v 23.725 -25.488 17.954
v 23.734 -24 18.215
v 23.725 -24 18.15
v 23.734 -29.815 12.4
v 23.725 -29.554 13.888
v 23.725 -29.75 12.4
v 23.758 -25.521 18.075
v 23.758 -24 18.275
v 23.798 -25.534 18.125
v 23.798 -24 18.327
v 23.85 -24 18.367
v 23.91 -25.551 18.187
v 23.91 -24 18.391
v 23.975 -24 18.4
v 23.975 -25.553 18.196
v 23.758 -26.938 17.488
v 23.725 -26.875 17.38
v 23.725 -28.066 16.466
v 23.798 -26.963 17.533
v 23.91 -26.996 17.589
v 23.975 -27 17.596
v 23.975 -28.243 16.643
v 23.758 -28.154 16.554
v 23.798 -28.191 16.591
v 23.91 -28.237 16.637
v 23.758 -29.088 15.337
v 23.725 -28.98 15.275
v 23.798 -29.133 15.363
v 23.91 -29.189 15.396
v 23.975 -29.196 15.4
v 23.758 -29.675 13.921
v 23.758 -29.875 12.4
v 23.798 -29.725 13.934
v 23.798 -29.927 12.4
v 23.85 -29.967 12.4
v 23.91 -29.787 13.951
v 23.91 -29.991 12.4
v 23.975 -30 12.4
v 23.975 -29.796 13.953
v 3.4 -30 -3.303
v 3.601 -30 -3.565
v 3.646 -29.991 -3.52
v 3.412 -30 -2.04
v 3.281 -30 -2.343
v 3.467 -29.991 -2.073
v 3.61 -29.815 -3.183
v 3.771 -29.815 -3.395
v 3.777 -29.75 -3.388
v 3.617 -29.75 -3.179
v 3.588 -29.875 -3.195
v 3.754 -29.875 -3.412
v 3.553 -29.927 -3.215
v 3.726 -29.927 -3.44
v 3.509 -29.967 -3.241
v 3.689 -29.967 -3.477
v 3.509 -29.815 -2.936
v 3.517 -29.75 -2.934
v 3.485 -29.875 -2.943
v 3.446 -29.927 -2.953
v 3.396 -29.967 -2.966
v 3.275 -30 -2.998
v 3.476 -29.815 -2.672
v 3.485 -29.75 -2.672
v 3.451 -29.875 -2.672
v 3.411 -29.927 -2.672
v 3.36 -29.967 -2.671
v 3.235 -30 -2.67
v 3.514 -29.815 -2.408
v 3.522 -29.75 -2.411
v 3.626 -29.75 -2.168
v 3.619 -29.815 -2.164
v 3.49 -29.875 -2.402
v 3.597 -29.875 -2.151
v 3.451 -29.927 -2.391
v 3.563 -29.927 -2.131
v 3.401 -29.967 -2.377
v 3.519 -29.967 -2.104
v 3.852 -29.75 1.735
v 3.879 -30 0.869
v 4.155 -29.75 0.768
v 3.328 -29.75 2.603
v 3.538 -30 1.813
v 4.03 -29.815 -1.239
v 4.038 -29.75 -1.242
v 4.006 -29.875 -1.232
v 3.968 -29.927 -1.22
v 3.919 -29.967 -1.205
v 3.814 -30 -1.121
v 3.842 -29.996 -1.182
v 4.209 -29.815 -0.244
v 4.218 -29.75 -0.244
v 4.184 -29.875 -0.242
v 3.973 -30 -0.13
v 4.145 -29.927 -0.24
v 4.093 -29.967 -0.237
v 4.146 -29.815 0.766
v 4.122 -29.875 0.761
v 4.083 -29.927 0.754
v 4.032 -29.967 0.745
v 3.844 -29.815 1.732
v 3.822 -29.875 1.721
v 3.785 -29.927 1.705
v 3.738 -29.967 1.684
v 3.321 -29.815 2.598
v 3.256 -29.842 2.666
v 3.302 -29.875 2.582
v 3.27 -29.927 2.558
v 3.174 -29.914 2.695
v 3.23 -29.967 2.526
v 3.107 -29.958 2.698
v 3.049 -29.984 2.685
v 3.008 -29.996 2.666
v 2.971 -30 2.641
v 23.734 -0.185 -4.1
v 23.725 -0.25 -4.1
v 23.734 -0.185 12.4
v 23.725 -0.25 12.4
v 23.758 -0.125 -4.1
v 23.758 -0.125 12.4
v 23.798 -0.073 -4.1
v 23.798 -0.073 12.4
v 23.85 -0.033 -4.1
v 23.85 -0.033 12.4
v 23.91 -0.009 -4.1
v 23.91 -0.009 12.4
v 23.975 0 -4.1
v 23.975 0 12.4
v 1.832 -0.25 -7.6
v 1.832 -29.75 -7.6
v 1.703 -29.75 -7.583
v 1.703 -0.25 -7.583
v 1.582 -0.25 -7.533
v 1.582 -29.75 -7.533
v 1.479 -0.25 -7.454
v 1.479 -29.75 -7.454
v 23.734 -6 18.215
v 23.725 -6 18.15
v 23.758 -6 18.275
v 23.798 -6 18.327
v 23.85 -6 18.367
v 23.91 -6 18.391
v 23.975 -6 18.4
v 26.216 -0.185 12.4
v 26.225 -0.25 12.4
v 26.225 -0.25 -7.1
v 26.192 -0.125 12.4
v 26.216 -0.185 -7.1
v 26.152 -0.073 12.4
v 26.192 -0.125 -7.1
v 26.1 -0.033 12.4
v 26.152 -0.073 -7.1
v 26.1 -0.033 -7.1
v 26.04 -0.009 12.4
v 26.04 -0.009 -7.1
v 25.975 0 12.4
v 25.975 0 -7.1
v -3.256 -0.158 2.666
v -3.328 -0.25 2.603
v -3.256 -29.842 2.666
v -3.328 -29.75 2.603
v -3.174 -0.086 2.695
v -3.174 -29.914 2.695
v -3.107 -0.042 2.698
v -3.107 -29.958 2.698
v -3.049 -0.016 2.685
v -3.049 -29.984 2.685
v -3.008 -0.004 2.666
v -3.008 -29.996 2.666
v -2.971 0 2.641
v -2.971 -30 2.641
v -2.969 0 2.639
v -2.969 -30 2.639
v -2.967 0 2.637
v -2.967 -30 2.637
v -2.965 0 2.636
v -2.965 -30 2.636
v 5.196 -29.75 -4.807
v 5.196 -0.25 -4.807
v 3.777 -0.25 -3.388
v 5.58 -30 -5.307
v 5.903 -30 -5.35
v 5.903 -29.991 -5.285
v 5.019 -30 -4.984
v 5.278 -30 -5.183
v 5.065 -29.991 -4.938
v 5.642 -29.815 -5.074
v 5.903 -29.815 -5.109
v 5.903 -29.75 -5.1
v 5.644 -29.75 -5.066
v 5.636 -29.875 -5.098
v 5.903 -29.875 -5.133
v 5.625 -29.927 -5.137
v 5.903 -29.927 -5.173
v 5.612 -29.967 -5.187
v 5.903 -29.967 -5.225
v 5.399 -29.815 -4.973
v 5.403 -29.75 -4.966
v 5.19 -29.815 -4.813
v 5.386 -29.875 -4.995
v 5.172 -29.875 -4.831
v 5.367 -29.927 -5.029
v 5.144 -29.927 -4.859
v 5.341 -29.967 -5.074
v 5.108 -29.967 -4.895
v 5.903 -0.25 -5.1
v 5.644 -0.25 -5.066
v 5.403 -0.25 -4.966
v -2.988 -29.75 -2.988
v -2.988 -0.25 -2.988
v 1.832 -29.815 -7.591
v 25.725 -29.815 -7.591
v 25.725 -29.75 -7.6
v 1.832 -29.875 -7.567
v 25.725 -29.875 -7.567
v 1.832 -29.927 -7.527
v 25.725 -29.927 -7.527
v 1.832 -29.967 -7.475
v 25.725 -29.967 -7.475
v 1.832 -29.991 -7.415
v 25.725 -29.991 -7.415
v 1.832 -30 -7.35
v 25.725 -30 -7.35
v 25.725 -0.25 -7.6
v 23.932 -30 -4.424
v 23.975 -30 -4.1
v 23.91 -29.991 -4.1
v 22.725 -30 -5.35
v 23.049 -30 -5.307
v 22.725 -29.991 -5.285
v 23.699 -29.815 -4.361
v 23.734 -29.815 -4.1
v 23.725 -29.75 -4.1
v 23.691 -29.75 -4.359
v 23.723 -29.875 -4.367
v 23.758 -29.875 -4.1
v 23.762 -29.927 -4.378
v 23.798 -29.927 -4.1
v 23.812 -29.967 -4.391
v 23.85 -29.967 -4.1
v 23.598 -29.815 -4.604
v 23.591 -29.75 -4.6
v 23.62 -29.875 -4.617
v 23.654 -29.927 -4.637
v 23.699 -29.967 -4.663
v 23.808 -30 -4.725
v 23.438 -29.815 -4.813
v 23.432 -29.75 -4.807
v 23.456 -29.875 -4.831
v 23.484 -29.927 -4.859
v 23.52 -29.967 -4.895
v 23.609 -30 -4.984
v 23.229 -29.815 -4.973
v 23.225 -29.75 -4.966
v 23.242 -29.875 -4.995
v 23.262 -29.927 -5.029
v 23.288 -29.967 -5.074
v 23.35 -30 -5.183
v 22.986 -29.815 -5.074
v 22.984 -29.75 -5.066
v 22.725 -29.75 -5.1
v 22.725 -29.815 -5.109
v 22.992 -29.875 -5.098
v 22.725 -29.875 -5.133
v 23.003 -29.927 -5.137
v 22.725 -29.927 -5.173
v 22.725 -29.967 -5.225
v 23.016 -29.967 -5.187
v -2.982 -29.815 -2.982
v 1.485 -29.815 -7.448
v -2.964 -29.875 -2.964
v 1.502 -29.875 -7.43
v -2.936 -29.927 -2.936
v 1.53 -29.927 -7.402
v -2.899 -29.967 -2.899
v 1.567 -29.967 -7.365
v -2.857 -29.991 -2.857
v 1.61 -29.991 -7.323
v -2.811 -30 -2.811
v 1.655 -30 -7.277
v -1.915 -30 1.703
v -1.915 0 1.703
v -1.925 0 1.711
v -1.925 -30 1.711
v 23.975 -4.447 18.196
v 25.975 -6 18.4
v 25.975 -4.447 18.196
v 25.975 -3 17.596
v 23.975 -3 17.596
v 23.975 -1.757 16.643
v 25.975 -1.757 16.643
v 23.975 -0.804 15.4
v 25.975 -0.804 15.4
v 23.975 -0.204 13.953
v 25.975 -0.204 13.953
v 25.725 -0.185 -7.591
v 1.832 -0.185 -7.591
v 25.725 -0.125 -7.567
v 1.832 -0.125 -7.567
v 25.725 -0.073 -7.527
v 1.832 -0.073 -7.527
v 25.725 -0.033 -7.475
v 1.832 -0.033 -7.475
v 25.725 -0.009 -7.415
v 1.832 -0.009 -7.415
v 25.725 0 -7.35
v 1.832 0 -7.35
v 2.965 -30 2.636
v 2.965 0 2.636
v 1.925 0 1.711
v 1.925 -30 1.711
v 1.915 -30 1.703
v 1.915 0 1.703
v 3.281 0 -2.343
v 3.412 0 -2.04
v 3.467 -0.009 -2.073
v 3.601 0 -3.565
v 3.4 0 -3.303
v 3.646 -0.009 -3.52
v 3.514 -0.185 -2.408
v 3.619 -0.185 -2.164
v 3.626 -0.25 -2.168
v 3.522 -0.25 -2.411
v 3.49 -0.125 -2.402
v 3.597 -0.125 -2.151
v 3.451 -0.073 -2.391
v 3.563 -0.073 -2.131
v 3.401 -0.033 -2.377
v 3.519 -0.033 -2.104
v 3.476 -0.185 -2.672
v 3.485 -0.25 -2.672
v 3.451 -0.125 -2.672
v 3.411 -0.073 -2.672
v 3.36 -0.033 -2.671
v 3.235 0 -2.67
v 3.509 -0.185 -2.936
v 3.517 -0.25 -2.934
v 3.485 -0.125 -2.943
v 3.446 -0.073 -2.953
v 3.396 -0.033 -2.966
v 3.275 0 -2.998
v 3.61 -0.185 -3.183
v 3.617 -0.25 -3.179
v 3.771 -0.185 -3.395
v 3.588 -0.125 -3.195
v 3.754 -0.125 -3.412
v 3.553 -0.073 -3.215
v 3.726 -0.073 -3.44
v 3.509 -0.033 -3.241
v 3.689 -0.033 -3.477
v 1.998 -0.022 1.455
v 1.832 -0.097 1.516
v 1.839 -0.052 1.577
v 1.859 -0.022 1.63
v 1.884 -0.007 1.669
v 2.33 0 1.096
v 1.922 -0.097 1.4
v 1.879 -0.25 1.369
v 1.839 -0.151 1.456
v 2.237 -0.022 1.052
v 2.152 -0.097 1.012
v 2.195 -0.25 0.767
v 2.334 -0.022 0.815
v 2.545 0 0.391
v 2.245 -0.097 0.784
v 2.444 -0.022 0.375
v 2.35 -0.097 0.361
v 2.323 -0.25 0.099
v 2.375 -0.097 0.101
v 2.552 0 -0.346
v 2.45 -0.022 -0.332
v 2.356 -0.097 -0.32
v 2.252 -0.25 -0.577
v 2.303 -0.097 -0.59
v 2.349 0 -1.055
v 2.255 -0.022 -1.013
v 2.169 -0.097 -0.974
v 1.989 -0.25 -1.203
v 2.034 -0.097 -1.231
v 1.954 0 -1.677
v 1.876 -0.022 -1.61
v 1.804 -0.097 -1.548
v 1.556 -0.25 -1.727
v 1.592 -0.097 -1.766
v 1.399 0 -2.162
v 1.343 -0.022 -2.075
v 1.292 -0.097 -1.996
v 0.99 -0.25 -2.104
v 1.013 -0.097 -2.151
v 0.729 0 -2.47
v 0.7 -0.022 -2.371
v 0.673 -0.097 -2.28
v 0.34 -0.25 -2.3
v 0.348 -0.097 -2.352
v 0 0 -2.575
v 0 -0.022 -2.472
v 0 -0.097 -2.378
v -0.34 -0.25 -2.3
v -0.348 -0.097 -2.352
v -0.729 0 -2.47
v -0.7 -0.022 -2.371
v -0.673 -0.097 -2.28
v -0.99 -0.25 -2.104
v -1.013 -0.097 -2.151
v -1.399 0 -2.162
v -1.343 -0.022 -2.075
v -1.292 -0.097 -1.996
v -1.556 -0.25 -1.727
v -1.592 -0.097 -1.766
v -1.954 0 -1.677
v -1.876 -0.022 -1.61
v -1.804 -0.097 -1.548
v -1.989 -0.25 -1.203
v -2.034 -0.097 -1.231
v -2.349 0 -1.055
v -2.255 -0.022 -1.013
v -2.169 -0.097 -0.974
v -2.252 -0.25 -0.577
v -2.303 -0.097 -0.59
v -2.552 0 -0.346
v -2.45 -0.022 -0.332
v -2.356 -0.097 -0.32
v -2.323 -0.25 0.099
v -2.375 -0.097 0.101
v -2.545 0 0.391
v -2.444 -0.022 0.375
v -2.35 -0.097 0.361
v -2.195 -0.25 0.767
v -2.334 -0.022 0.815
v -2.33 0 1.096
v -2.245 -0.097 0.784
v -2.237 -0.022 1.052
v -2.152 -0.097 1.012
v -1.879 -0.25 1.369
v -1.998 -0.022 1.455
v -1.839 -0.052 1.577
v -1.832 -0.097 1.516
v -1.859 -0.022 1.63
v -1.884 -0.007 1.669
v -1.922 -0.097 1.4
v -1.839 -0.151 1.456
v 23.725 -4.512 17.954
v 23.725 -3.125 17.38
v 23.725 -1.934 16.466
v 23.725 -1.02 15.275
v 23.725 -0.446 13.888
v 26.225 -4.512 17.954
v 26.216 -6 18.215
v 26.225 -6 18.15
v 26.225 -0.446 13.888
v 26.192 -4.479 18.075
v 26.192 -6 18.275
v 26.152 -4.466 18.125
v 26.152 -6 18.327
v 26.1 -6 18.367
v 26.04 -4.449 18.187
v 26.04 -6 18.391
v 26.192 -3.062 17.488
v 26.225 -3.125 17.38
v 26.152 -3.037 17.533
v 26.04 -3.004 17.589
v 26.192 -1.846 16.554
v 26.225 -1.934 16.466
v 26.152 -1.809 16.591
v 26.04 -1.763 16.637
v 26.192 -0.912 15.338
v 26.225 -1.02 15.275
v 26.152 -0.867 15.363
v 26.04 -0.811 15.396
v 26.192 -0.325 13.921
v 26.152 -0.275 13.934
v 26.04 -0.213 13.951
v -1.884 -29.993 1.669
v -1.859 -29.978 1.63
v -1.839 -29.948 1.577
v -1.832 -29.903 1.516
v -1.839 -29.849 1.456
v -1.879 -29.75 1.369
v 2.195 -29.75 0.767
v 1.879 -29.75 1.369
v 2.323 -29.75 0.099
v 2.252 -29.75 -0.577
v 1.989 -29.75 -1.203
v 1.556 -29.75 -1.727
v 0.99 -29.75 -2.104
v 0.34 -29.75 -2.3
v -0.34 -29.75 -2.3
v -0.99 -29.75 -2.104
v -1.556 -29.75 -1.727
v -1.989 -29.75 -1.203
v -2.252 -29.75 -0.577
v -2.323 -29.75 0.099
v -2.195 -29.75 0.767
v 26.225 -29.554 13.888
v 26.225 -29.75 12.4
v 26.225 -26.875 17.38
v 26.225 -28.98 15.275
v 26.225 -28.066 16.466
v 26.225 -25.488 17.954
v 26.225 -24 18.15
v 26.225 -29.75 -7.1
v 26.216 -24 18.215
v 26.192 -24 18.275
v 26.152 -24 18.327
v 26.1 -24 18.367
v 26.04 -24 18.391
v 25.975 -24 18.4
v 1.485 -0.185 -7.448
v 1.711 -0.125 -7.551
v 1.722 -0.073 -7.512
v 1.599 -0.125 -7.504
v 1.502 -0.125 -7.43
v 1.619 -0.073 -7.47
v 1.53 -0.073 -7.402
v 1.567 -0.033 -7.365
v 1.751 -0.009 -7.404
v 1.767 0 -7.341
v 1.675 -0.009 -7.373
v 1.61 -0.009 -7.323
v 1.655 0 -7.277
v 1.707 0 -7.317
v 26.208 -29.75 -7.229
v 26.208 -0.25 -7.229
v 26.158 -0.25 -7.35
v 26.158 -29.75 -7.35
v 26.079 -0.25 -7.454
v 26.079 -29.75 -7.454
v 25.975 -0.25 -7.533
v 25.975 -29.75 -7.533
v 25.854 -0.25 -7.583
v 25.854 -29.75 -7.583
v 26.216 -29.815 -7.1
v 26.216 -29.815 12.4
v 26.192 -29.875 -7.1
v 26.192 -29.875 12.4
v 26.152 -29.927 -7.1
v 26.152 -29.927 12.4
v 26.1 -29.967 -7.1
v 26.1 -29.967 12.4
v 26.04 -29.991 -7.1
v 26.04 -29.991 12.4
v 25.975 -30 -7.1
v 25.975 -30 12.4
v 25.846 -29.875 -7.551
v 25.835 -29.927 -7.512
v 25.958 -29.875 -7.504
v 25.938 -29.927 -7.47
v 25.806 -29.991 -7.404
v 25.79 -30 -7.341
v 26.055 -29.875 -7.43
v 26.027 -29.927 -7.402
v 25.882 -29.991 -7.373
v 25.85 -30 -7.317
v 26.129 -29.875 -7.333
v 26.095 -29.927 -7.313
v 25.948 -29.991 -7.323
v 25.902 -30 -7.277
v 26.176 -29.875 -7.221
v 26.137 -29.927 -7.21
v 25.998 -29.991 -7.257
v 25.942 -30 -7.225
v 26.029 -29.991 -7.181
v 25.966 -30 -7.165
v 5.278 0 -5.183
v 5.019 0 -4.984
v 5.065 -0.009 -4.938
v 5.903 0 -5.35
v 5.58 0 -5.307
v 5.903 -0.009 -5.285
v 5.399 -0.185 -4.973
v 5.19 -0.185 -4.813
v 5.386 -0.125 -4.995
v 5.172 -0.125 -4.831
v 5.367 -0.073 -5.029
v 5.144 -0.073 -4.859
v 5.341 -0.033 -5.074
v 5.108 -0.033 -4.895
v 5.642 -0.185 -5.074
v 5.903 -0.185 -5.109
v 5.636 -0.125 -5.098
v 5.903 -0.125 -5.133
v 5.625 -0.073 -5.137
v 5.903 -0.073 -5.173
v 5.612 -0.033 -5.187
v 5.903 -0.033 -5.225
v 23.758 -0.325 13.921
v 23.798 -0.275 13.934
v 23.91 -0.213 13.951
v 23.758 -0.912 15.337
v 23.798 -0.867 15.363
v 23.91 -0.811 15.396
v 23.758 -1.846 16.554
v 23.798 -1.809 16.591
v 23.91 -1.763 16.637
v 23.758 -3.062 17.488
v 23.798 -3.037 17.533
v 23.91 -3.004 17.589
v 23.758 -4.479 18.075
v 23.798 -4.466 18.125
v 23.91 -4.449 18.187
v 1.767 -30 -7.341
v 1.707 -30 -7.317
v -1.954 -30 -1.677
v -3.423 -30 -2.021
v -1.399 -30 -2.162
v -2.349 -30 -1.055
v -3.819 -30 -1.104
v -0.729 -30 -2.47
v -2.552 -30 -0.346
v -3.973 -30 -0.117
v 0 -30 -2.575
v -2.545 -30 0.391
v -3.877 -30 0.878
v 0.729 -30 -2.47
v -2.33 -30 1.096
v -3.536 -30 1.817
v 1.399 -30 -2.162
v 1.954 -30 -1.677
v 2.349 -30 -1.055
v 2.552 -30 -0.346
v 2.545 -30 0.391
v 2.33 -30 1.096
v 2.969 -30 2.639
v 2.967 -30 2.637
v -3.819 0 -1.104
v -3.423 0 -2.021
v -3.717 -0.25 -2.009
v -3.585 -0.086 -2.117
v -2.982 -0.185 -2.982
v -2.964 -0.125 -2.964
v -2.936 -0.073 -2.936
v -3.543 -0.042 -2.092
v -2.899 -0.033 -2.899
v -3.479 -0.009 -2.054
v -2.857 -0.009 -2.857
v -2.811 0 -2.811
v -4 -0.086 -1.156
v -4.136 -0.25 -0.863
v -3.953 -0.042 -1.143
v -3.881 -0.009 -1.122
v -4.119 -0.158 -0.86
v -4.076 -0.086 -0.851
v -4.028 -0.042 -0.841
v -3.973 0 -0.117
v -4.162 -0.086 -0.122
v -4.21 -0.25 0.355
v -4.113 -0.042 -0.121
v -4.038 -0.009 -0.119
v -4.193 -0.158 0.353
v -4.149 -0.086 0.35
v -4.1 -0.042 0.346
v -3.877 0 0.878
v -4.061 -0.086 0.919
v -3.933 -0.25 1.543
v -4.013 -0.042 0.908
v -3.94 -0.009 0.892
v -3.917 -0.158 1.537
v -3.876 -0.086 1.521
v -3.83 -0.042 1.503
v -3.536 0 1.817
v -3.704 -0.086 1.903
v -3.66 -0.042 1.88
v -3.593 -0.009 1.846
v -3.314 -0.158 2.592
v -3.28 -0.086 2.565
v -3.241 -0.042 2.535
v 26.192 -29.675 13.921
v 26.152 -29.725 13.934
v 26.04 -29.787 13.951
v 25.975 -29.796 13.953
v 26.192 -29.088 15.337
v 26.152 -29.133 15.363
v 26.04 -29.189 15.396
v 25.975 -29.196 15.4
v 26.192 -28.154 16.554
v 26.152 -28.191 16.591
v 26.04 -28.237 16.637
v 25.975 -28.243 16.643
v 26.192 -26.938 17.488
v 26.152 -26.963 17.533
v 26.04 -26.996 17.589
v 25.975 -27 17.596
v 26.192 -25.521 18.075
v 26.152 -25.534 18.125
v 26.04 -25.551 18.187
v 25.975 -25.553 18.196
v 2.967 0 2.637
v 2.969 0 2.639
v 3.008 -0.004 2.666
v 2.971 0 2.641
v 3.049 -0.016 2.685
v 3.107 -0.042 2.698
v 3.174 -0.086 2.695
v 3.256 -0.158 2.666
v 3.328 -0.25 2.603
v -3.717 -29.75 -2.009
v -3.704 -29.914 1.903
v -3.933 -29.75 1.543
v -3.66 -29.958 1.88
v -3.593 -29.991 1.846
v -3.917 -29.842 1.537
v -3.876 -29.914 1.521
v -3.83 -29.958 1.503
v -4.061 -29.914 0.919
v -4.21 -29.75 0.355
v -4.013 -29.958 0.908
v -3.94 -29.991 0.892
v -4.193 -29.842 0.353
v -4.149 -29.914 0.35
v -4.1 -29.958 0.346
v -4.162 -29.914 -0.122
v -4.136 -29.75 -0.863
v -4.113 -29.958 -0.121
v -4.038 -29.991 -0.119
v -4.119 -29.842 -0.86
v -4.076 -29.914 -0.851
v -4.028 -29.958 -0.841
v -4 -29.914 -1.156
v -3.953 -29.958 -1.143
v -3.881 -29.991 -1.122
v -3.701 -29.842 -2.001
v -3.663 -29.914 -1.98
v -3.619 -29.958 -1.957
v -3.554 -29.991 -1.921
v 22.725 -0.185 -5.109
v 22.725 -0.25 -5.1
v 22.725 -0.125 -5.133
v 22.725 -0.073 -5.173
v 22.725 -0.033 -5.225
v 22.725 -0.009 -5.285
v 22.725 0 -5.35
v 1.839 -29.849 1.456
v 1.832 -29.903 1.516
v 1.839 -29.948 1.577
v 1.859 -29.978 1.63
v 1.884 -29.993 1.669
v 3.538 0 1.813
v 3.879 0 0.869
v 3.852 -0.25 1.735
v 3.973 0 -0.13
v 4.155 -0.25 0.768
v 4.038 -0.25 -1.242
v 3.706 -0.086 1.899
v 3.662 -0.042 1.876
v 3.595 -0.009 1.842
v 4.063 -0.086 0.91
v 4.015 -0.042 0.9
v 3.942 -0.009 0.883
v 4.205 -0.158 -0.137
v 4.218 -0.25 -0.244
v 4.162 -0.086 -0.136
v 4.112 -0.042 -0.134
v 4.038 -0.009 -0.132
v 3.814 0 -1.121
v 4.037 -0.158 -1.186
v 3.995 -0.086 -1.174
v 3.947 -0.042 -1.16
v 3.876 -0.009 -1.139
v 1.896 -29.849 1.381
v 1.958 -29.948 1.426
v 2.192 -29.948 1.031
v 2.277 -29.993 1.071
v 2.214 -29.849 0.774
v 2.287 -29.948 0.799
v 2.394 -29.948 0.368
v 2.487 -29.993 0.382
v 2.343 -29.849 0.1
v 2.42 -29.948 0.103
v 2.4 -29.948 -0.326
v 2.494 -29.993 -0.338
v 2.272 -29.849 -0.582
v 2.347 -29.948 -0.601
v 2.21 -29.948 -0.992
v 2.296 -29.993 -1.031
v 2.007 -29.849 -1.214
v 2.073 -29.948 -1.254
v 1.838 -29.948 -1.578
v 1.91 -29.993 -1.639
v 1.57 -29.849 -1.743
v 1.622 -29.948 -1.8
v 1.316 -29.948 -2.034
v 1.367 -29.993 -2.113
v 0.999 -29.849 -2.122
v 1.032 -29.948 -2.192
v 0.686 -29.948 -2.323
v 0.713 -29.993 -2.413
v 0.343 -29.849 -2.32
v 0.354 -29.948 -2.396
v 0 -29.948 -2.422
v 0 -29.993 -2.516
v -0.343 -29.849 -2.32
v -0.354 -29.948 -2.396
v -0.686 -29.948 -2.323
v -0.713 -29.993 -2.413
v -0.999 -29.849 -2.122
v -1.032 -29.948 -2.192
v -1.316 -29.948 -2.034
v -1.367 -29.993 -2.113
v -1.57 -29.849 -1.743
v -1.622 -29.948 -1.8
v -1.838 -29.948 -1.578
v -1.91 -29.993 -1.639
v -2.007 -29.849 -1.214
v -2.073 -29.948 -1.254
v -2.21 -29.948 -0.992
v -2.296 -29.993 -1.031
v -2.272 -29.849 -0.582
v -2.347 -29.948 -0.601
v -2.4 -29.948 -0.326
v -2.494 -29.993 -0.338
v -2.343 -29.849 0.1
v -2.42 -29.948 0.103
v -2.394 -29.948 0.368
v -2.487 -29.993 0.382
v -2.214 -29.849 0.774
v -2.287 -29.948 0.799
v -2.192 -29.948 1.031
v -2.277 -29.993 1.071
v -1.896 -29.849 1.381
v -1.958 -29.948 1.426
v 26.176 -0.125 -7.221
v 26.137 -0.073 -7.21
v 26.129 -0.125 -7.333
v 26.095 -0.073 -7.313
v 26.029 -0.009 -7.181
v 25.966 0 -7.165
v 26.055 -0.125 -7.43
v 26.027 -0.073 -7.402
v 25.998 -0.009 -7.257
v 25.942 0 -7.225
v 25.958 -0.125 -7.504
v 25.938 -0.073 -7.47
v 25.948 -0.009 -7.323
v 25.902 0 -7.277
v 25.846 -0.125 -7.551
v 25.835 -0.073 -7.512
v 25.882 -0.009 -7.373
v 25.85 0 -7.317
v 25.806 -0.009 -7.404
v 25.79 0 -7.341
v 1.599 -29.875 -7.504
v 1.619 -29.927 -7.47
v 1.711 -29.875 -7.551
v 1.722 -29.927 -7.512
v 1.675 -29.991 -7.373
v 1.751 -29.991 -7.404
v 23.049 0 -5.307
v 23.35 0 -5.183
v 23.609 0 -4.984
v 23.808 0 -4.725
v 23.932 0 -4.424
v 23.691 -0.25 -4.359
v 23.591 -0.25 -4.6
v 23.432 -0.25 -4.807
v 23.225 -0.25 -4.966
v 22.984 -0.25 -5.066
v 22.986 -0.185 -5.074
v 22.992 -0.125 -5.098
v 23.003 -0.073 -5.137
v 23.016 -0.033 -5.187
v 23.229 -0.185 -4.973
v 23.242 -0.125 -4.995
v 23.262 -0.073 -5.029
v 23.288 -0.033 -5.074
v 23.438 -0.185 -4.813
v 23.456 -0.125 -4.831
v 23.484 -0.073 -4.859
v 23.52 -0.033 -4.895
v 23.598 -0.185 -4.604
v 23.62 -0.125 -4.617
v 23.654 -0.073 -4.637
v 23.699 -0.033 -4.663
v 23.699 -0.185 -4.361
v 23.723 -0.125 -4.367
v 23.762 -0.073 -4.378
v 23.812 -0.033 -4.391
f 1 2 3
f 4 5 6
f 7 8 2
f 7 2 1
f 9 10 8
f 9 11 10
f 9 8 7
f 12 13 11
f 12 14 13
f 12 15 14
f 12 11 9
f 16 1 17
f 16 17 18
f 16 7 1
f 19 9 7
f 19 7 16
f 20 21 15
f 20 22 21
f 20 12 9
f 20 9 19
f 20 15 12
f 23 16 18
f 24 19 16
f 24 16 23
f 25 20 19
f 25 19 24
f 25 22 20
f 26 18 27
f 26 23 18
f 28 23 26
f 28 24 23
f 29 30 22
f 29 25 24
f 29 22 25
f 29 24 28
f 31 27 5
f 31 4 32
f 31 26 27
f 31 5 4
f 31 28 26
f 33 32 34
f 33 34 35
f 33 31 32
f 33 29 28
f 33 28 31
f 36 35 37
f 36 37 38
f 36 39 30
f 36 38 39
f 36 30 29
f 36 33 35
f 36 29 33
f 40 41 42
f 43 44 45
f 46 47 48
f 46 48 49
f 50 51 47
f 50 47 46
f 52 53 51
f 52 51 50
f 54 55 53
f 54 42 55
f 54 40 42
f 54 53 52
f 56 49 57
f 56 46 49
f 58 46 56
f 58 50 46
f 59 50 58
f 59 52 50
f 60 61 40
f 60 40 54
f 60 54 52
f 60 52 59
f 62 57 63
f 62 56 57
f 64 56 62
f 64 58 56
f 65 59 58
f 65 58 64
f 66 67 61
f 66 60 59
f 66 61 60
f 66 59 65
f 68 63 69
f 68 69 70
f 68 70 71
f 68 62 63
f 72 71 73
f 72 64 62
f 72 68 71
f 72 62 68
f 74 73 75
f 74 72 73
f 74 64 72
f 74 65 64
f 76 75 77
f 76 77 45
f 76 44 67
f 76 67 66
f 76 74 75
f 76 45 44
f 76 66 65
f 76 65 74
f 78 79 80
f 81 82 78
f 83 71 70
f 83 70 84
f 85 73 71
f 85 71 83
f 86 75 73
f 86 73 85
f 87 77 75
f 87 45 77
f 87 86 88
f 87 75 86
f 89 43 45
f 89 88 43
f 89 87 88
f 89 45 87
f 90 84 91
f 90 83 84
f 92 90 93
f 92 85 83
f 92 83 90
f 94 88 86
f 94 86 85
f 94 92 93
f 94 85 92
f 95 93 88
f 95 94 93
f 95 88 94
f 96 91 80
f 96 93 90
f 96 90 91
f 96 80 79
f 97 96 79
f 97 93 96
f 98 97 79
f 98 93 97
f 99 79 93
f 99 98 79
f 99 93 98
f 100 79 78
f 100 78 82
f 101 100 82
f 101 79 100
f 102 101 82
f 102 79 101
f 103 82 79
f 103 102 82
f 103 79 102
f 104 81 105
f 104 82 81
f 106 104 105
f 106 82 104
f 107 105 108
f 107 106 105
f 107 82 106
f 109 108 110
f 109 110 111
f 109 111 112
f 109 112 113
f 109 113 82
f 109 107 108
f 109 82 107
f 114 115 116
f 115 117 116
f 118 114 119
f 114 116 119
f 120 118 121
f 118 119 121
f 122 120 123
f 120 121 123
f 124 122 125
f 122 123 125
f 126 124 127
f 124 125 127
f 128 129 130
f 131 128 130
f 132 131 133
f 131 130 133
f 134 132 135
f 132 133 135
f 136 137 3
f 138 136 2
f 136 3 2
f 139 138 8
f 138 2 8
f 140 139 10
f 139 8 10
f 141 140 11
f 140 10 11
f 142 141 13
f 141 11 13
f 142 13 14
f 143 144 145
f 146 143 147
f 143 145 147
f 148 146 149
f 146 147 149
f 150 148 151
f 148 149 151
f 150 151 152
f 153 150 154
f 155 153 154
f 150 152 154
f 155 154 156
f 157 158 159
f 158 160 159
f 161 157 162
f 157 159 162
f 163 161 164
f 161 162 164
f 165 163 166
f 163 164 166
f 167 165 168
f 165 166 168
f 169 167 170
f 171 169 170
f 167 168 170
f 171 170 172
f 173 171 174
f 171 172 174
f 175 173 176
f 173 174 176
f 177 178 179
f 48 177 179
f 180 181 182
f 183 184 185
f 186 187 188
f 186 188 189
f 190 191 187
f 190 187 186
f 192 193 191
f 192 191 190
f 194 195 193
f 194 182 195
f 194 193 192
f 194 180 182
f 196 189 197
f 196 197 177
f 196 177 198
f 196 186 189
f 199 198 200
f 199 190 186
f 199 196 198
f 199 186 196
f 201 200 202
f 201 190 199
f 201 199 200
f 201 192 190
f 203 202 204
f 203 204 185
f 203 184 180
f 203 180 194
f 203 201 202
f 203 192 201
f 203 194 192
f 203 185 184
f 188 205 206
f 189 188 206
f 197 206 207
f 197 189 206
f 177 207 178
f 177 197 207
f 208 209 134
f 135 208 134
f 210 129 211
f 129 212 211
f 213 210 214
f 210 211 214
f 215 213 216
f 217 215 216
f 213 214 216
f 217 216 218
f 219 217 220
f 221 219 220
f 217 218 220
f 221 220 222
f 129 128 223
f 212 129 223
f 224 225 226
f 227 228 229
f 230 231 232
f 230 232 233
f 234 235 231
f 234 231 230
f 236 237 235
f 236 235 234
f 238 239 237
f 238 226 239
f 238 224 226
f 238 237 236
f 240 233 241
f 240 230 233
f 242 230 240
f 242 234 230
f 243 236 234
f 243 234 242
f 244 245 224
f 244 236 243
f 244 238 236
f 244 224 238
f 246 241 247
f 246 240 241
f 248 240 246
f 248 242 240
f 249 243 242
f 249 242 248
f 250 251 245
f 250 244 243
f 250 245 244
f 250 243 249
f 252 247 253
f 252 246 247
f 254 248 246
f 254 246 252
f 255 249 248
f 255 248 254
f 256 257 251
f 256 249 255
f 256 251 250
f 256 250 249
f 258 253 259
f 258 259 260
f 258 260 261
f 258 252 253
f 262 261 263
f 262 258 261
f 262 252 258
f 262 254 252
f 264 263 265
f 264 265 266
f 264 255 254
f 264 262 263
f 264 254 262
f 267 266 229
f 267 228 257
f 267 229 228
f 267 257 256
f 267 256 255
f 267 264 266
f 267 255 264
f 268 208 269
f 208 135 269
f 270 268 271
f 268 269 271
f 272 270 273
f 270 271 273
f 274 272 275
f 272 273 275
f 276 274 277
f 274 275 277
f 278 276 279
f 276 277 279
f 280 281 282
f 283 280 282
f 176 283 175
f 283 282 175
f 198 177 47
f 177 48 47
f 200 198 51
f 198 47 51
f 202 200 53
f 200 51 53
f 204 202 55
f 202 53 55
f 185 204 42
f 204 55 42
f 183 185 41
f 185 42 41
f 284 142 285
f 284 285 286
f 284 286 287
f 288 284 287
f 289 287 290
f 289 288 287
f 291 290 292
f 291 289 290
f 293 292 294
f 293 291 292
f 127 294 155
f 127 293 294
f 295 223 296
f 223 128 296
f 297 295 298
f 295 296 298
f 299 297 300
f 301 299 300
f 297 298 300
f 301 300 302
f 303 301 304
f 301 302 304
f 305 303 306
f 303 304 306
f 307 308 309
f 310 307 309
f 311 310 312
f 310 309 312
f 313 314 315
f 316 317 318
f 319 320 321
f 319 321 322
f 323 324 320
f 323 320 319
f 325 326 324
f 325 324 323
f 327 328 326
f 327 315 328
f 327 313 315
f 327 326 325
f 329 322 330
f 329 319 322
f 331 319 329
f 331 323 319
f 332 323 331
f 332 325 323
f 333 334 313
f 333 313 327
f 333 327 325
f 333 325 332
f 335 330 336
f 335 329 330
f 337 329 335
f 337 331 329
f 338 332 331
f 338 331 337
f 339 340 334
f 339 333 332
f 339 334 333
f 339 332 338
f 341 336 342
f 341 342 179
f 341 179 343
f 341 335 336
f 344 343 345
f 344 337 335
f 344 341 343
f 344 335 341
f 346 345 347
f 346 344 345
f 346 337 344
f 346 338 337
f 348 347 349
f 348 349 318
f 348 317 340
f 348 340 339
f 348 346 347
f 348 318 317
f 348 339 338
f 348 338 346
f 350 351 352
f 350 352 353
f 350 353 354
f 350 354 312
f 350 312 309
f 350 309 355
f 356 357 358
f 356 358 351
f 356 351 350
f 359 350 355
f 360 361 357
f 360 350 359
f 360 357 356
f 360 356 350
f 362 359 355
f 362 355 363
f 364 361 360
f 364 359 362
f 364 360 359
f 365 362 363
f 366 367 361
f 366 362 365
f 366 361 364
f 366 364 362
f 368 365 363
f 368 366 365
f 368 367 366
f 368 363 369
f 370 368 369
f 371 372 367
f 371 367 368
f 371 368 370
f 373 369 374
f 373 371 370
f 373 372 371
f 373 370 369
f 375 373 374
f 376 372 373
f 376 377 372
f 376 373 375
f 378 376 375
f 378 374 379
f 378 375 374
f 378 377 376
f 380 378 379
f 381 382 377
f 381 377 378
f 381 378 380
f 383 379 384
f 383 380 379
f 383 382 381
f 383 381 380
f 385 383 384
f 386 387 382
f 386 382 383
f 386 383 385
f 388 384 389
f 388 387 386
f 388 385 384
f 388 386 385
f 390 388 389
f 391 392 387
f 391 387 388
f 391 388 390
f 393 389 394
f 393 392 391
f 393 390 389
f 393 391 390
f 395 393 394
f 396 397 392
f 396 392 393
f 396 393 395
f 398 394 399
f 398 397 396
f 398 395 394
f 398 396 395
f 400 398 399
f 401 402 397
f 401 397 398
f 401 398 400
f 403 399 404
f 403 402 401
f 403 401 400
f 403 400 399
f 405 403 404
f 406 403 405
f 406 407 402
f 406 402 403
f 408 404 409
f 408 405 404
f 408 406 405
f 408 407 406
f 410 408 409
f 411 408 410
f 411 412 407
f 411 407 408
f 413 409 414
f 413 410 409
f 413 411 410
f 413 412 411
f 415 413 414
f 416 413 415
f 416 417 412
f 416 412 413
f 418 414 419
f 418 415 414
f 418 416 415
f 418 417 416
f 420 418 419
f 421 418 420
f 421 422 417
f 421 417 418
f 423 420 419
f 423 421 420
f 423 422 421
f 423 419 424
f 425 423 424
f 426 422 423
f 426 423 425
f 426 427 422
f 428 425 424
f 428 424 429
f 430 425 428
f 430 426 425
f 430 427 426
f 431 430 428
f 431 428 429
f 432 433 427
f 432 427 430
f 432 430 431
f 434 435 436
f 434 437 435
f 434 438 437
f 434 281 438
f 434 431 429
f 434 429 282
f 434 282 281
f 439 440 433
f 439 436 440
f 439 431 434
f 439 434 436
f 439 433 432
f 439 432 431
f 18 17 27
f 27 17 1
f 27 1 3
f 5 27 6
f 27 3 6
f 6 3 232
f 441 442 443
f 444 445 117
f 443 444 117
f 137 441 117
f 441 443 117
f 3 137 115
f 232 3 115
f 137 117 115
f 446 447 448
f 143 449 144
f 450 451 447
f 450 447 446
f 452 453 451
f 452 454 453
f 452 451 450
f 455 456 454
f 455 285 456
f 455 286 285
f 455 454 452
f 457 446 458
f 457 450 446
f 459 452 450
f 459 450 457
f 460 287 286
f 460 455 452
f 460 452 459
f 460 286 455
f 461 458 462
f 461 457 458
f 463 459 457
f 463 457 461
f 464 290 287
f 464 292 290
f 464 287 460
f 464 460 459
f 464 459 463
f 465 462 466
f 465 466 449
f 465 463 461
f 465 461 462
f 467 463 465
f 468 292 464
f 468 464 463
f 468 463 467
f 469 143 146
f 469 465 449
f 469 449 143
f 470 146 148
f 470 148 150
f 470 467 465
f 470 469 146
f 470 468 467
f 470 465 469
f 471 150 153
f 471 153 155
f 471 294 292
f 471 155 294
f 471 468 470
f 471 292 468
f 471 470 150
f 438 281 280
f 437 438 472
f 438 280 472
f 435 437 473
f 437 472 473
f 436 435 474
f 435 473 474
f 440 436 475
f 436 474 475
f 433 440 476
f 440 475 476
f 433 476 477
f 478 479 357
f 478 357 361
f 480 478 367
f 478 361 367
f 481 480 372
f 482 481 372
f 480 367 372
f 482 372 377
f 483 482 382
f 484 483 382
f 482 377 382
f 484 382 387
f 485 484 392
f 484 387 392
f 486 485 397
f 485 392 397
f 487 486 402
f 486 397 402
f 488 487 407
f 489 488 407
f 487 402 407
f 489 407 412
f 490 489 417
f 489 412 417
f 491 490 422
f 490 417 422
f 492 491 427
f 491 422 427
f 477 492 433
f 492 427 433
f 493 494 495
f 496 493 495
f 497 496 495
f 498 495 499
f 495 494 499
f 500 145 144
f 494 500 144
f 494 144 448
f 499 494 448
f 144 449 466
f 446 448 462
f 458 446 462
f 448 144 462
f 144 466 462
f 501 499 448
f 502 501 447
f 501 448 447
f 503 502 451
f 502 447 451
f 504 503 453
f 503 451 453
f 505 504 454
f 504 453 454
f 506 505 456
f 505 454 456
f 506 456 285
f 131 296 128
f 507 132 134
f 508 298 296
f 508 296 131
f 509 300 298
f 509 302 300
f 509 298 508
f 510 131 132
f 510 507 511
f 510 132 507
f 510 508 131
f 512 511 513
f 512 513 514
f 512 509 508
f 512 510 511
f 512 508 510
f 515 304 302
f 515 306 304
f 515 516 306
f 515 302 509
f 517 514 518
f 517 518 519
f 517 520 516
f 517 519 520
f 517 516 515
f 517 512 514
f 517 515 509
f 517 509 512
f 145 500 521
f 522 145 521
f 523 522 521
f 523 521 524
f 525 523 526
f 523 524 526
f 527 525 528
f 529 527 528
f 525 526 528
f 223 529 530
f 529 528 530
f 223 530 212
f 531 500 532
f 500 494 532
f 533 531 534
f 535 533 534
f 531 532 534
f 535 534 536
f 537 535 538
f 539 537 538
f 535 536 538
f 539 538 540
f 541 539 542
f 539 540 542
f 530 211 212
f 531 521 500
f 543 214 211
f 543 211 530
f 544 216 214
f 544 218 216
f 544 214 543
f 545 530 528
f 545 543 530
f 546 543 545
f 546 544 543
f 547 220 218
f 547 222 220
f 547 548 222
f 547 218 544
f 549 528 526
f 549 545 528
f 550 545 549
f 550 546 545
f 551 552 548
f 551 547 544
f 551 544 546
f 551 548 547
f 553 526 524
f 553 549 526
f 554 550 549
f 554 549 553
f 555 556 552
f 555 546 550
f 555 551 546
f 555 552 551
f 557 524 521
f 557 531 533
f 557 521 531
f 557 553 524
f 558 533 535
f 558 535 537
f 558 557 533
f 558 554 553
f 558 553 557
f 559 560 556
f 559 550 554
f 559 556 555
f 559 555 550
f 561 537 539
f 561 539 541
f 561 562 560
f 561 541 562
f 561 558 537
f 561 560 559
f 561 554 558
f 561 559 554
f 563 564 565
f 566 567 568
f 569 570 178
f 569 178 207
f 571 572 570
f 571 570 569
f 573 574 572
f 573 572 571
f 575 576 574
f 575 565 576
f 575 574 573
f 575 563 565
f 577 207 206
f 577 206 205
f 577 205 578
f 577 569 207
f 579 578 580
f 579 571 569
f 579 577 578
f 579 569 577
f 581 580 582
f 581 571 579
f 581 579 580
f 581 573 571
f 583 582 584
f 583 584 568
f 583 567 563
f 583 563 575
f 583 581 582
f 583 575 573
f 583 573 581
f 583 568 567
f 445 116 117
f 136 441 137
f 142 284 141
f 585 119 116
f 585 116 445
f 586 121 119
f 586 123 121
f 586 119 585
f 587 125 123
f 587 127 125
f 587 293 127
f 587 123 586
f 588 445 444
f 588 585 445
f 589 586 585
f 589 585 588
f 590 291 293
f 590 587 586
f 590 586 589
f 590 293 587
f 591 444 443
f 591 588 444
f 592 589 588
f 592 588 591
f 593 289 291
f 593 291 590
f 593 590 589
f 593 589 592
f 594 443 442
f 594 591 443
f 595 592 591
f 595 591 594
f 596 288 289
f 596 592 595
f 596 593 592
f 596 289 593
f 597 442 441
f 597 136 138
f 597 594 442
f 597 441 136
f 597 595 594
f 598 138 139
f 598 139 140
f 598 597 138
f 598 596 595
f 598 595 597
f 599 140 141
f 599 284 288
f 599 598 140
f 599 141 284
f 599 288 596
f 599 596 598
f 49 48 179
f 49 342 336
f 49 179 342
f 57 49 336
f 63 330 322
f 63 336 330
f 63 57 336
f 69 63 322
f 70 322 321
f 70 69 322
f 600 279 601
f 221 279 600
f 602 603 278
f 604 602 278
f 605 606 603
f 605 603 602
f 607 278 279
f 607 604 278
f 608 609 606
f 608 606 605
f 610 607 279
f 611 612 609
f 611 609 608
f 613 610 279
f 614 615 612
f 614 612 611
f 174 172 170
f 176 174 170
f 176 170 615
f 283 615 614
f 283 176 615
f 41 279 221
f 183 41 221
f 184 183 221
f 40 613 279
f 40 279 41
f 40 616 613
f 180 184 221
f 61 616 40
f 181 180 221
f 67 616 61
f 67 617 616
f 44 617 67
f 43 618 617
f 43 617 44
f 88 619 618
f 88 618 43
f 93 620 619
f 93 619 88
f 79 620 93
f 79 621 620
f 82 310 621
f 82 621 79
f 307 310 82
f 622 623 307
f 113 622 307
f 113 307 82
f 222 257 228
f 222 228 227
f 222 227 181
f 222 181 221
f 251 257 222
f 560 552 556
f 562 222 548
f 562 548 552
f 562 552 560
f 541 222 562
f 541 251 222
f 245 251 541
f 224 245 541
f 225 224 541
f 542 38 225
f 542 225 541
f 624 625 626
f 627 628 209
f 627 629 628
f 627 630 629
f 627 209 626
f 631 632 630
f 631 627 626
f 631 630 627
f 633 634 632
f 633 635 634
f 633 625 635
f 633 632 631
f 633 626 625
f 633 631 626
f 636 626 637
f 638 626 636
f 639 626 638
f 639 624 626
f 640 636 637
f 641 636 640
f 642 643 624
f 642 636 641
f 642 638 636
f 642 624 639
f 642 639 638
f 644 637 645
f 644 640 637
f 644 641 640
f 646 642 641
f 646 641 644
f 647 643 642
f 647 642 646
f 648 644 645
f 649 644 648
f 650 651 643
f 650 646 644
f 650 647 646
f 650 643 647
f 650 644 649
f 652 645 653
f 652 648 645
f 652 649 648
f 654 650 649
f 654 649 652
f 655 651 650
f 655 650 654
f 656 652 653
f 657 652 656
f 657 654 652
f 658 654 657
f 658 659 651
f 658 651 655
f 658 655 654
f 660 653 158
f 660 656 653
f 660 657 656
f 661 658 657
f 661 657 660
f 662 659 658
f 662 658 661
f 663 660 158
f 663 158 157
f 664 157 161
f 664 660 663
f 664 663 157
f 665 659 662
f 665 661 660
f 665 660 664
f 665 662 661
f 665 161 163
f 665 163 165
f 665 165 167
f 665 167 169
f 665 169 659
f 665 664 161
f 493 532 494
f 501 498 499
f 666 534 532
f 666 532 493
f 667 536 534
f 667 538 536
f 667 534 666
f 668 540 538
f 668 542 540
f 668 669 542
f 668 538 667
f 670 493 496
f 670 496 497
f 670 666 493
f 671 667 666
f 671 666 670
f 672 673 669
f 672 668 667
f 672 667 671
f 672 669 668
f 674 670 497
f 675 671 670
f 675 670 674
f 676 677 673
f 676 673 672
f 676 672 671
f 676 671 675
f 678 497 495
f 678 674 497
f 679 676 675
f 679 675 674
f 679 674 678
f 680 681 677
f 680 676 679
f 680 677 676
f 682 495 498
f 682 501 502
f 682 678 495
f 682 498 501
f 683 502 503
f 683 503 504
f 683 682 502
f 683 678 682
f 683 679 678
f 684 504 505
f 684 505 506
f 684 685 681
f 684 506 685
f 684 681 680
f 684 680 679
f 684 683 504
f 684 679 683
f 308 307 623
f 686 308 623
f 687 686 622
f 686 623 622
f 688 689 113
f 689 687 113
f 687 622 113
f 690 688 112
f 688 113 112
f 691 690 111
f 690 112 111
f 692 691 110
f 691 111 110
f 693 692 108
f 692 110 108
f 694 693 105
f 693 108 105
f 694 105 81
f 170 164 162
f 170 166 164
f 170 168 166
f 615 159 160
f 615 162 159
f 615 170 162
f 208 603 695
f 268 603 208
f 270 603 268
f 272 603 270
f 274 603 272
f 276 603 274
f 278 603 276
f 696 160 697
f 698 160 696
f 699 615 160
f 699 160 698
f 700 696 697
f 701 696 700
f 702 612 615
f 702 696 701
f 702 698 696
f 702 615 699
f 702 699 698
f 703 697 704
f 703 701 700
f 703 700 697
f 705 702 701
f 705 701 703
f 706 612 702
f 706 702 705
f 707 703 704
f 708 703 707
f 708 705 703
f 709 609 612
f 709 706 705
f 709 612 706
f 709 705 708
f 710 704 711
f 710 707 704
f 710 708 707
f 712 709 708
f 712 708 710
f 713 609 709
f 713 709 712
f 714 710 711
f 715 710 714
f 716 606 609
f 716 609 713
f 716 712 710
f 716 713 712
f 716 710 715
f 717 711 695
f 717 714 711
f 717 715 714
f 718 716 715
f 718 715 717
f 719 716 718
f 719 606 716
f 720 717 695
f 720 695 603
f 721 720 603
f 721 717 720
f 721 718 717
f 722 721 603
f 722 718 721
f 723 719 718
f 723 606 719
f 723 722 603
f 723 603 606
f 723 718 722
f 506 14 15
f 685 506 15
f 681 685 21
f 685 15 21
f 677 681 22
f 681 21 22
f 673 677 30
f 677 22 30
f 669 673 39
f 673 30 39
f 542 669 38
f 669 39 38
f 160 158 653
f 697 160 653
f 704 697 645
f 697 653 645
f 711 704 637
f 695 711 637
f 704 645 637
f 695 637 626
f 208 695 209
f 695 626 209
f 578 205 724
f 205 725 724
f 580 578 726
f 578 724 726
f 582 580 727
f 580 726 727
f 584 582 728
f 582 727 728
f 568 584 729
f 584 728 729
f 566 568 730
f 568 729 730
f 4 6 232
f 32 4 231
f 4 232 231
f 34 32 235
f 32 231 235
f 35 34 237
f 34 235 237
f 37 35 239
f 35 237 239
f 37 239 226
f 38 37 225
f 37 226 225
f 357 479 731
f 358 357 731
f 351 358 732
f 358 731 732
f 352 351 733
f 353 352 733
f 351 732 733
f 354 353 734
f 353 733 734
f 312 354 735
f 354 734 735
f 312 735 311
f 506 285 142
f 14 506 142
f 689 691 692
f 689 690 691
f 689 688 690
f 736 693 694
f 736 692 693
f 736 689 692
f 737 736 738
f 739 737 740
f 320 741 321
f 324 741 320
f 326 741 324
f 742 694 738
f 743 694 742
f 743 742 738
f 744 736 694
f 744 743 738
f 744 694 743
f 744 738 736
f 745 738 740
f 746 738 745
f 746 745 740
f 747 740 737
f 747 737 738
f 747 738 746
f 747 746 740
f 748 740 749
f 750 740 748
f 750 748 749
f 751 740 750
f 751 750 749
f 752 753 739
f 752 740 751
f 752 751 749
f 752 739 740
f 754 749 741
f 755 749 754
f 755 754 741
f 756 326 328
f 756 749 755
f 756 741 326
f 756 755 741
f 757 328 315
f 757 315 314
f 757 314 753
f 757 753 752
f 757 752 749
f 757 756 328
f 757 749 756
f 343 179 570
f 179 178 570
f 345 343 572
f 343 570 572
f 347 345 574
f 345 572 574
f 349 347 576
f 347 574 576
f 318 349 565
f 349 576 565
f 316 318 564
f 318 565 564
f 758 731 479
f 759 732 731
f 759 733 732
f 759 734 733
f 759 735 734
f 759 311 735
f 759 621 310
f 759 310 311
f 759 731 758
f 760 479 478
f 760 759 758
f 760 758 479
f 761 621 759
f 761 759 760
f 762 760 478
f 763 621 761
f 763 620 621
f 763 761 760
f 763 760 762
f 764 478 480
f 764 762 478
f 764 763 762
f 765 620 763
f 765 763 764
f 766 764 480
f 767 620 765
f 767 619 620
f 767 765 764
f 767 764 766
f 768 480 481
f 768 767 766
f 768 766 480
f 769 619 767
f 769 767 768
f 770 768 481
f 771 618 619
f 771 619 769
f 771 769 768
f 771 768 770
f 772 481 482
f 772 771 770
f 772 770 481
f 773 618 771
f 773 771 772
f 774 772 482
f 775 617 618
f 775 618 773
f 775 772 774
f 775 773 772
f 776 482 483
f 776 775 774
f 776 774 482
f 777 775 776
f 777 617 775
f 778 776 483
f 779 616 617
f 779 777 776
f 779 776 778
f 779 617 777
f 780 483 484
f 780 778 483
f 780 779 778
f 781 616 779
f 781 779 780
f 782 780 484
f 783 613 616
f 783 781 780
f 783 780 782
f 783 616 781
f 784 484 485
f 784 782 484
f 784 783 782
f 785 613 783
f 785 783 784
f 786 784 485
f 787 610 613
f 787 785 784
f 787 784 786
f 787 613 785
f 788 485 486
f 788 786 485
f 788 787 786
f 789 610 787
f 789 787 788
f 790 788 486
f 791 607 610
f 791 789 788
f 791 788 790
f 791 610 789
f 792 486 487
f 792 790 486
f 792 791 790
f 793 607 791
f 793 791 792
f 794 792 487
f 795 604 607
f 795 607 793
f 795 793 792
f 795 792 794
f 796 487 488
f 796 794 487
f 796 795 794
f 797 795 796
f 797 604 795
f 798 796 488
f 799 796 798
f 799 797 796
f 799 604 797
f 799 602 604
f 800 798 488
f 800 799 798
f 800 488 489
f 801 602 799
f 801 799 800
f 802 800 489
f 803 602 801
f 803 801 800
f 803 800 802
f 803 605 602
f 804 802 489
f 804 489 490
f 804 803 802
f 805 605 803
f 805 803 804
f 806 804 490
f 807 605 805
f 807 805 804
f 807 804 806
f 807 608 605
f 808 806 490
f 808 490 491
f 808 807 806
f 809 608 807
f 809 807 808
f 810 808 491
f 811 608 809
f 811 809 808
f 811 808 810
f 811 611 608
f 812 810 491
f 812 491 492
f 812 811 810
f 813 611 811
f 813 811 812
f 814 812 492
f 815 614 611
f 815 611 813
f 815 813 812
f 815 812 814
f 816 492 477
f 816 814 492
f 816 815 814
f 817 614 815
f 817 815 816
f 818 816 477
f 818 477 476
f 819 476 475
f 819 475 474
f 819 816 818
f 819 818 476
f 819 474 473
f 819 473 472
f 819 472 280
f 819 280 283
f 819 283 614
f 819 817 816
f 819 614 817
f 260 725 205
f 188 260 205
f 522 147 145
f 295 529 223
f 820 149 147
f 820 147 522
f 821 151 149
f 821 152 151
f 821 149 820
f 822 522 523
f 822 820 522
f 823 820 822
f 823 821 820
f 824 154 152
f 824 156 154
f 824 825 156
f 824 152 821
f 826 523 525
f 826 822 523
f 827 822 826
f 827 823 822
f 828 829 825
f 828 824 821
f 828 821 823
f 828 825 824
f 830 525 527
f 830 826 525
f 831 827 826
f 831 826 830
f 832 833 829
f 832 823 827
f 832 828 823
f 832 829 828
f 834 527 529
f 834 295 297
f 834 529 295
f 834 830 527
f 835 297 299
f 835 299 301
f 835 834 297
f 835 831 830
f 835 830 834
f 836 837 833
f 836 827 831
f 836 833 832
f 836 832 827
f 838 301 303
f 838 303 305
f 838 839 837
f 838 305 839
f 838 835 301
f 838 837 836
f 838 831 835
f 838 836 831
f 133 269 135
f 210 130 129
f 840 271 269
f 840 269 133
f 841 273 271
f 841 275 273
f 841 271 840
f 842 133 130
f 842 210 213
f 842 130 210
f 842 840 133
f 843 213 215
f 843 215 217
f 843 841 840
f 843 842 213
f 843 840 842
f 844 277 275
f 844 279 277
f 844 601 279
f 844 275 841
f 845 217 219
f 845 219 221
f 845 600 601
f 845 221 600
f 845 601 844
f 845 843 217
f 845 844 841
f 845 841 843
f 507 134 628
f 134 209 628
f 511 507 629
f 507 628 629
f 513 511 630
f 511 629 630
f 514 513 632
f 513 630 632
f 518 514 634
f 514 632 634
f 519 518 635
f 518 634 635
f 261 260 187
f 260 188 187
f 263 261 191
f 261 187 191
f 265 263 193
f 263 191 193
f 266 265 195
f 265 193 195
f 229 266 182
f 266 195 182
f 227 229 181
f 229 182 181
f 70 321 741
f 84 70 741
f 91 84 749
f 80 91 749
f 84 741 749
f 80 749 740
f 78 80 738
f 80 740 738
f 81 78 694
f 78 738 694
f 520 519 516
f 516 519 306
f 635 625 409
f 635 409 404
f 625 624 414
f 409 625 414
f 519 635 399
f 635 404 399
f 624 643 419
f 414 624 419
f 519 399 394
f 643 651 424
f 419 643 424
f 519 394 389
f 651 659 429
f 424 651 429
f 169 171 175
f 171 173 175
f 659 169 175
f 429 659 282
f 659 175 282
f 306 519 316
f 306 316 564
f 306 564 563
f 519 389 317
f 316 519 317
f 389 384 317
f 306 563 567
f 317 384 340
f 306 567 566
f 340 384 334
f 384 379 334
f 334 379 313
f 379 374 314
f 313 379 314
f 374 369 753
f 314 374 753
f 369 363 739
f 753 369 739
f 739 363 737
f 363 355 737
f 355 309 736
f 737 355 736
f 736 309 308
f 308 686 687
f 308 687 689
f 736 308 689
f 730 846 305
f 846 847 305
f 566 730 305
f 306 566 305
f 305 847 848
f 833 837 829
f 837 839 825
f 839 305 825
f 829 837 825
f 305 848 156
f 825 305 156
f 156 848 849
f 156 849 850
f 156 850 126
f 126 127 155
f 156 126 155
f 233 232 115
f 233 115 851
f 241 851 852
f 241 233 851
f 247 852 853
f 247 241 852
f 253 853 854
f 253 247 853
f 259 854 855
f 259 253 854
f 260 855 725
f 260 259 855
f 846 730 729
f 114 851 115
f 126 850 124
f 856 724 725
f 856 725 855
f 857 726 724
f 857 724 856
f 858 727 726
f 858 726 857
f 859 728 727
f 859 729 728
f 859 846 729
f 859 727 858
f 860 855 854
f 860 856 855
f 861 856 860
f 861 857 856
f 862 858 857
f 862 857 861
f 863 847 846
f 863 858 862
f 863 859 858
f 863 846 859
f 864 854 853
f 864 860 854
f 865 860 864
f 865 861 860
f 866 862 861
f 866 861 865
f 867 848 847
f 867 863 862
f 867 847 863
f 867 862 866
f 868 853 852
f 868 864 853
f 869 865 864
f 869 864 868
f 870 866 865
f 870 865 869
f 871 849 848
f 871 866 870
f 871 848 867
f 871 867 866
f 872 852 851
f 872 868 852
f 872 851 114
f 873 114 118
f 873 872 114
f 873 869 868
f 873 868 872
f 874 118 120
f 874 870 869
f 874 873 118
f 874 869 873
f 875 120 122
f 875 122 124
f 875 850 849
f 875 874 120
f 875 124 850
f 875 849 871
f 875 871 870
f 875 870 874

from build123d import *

# Parameters (mm, degrees)
F1_DEPTH = 30
F2_R     = 6
F3_R     = 1
F4_R     = 0.5
F5_R     = 0.25


with BuildPart() as f1:
    # F0 (on Front) → F1 (new body)
    with BuildSketch(Plane.XZ):
        with BuildLine():
            ThreePointArc((1.737687, 1.54469), (0, -2.325), (-1.737687, 1.54469))
            Line((-1.737687, 1.54469), (-3.157733, 2.807018))
            ThreePointArc((-3.157733, 2.807018), (-4.223178, -0.12405), (-2.987526, -2.987526))
            Line((-2.987526, -2.987526), (1.624948, -7.6))
            Line((1.624948, -7.6), (26.225, -7.6))
            Line((26.225, -7.6), (26.225, 18.4))
            Line((26.225, 18.4), (23.725, 18.4))
            Line((23.725, 18.4), (23.725, -5.1))
            Line((23.725, -5.1), (5.488909, -5.1))
            Line((5.488909, -5.1), (3.175645, -2.786737))
            ThreePointArc((3.175645, -2.786737), (4.224978, 0.013529), (3.157733, 2.807018))
            Line((3.157733, 2.807018), (1.737687, 1.54469))
        make_face()
    extrude(amount=F1_DEPTH)

    # F2
    f2_edges = [f1.edges().sort_by_distance(p)[0] for p in [
        (24.975, -30, 18.4),
        (24.975, 0, 18.4),
    ]]
    fillet(f2_edges, radius=F2_R)

    # F3
    f3_edges = [f1.edges().sort_by_distance(p)[0] for p in [
        (23.725, -15, -5.1),
        (5.488909, -15, -5.1),
        (3.175645, -15, -2.786737),
    ]]
    fillet(f3_edges, radius=F3_R)

    # F4
    f4_edges = [f1.edges().sort_by_distance(p)[0] for p in [
        (26.225, -15, -7.6),
        (1.624948, -15, -7.6),
    ]]
    fillet(f4_edges, radius=F4_R)

    # F5
    f5_edges = [f1.edges().sort_by_distance(p)[0] for p in [
        (-1.737687, -15, 1.54469),
        (-3.157733, -15, 2.807018),
        (1.737687, -15, 1.54469),
        (3.157733, -15, 2.807018),
        (4.206392, -30, 0.396098),
        (-4.223178, -30, -0.12405),
        (0, -30, -2.325),
        (0, 0, -2.325),
    ]]
    fillet(f5_edges, radius=F5_R)


solid = f1.part
